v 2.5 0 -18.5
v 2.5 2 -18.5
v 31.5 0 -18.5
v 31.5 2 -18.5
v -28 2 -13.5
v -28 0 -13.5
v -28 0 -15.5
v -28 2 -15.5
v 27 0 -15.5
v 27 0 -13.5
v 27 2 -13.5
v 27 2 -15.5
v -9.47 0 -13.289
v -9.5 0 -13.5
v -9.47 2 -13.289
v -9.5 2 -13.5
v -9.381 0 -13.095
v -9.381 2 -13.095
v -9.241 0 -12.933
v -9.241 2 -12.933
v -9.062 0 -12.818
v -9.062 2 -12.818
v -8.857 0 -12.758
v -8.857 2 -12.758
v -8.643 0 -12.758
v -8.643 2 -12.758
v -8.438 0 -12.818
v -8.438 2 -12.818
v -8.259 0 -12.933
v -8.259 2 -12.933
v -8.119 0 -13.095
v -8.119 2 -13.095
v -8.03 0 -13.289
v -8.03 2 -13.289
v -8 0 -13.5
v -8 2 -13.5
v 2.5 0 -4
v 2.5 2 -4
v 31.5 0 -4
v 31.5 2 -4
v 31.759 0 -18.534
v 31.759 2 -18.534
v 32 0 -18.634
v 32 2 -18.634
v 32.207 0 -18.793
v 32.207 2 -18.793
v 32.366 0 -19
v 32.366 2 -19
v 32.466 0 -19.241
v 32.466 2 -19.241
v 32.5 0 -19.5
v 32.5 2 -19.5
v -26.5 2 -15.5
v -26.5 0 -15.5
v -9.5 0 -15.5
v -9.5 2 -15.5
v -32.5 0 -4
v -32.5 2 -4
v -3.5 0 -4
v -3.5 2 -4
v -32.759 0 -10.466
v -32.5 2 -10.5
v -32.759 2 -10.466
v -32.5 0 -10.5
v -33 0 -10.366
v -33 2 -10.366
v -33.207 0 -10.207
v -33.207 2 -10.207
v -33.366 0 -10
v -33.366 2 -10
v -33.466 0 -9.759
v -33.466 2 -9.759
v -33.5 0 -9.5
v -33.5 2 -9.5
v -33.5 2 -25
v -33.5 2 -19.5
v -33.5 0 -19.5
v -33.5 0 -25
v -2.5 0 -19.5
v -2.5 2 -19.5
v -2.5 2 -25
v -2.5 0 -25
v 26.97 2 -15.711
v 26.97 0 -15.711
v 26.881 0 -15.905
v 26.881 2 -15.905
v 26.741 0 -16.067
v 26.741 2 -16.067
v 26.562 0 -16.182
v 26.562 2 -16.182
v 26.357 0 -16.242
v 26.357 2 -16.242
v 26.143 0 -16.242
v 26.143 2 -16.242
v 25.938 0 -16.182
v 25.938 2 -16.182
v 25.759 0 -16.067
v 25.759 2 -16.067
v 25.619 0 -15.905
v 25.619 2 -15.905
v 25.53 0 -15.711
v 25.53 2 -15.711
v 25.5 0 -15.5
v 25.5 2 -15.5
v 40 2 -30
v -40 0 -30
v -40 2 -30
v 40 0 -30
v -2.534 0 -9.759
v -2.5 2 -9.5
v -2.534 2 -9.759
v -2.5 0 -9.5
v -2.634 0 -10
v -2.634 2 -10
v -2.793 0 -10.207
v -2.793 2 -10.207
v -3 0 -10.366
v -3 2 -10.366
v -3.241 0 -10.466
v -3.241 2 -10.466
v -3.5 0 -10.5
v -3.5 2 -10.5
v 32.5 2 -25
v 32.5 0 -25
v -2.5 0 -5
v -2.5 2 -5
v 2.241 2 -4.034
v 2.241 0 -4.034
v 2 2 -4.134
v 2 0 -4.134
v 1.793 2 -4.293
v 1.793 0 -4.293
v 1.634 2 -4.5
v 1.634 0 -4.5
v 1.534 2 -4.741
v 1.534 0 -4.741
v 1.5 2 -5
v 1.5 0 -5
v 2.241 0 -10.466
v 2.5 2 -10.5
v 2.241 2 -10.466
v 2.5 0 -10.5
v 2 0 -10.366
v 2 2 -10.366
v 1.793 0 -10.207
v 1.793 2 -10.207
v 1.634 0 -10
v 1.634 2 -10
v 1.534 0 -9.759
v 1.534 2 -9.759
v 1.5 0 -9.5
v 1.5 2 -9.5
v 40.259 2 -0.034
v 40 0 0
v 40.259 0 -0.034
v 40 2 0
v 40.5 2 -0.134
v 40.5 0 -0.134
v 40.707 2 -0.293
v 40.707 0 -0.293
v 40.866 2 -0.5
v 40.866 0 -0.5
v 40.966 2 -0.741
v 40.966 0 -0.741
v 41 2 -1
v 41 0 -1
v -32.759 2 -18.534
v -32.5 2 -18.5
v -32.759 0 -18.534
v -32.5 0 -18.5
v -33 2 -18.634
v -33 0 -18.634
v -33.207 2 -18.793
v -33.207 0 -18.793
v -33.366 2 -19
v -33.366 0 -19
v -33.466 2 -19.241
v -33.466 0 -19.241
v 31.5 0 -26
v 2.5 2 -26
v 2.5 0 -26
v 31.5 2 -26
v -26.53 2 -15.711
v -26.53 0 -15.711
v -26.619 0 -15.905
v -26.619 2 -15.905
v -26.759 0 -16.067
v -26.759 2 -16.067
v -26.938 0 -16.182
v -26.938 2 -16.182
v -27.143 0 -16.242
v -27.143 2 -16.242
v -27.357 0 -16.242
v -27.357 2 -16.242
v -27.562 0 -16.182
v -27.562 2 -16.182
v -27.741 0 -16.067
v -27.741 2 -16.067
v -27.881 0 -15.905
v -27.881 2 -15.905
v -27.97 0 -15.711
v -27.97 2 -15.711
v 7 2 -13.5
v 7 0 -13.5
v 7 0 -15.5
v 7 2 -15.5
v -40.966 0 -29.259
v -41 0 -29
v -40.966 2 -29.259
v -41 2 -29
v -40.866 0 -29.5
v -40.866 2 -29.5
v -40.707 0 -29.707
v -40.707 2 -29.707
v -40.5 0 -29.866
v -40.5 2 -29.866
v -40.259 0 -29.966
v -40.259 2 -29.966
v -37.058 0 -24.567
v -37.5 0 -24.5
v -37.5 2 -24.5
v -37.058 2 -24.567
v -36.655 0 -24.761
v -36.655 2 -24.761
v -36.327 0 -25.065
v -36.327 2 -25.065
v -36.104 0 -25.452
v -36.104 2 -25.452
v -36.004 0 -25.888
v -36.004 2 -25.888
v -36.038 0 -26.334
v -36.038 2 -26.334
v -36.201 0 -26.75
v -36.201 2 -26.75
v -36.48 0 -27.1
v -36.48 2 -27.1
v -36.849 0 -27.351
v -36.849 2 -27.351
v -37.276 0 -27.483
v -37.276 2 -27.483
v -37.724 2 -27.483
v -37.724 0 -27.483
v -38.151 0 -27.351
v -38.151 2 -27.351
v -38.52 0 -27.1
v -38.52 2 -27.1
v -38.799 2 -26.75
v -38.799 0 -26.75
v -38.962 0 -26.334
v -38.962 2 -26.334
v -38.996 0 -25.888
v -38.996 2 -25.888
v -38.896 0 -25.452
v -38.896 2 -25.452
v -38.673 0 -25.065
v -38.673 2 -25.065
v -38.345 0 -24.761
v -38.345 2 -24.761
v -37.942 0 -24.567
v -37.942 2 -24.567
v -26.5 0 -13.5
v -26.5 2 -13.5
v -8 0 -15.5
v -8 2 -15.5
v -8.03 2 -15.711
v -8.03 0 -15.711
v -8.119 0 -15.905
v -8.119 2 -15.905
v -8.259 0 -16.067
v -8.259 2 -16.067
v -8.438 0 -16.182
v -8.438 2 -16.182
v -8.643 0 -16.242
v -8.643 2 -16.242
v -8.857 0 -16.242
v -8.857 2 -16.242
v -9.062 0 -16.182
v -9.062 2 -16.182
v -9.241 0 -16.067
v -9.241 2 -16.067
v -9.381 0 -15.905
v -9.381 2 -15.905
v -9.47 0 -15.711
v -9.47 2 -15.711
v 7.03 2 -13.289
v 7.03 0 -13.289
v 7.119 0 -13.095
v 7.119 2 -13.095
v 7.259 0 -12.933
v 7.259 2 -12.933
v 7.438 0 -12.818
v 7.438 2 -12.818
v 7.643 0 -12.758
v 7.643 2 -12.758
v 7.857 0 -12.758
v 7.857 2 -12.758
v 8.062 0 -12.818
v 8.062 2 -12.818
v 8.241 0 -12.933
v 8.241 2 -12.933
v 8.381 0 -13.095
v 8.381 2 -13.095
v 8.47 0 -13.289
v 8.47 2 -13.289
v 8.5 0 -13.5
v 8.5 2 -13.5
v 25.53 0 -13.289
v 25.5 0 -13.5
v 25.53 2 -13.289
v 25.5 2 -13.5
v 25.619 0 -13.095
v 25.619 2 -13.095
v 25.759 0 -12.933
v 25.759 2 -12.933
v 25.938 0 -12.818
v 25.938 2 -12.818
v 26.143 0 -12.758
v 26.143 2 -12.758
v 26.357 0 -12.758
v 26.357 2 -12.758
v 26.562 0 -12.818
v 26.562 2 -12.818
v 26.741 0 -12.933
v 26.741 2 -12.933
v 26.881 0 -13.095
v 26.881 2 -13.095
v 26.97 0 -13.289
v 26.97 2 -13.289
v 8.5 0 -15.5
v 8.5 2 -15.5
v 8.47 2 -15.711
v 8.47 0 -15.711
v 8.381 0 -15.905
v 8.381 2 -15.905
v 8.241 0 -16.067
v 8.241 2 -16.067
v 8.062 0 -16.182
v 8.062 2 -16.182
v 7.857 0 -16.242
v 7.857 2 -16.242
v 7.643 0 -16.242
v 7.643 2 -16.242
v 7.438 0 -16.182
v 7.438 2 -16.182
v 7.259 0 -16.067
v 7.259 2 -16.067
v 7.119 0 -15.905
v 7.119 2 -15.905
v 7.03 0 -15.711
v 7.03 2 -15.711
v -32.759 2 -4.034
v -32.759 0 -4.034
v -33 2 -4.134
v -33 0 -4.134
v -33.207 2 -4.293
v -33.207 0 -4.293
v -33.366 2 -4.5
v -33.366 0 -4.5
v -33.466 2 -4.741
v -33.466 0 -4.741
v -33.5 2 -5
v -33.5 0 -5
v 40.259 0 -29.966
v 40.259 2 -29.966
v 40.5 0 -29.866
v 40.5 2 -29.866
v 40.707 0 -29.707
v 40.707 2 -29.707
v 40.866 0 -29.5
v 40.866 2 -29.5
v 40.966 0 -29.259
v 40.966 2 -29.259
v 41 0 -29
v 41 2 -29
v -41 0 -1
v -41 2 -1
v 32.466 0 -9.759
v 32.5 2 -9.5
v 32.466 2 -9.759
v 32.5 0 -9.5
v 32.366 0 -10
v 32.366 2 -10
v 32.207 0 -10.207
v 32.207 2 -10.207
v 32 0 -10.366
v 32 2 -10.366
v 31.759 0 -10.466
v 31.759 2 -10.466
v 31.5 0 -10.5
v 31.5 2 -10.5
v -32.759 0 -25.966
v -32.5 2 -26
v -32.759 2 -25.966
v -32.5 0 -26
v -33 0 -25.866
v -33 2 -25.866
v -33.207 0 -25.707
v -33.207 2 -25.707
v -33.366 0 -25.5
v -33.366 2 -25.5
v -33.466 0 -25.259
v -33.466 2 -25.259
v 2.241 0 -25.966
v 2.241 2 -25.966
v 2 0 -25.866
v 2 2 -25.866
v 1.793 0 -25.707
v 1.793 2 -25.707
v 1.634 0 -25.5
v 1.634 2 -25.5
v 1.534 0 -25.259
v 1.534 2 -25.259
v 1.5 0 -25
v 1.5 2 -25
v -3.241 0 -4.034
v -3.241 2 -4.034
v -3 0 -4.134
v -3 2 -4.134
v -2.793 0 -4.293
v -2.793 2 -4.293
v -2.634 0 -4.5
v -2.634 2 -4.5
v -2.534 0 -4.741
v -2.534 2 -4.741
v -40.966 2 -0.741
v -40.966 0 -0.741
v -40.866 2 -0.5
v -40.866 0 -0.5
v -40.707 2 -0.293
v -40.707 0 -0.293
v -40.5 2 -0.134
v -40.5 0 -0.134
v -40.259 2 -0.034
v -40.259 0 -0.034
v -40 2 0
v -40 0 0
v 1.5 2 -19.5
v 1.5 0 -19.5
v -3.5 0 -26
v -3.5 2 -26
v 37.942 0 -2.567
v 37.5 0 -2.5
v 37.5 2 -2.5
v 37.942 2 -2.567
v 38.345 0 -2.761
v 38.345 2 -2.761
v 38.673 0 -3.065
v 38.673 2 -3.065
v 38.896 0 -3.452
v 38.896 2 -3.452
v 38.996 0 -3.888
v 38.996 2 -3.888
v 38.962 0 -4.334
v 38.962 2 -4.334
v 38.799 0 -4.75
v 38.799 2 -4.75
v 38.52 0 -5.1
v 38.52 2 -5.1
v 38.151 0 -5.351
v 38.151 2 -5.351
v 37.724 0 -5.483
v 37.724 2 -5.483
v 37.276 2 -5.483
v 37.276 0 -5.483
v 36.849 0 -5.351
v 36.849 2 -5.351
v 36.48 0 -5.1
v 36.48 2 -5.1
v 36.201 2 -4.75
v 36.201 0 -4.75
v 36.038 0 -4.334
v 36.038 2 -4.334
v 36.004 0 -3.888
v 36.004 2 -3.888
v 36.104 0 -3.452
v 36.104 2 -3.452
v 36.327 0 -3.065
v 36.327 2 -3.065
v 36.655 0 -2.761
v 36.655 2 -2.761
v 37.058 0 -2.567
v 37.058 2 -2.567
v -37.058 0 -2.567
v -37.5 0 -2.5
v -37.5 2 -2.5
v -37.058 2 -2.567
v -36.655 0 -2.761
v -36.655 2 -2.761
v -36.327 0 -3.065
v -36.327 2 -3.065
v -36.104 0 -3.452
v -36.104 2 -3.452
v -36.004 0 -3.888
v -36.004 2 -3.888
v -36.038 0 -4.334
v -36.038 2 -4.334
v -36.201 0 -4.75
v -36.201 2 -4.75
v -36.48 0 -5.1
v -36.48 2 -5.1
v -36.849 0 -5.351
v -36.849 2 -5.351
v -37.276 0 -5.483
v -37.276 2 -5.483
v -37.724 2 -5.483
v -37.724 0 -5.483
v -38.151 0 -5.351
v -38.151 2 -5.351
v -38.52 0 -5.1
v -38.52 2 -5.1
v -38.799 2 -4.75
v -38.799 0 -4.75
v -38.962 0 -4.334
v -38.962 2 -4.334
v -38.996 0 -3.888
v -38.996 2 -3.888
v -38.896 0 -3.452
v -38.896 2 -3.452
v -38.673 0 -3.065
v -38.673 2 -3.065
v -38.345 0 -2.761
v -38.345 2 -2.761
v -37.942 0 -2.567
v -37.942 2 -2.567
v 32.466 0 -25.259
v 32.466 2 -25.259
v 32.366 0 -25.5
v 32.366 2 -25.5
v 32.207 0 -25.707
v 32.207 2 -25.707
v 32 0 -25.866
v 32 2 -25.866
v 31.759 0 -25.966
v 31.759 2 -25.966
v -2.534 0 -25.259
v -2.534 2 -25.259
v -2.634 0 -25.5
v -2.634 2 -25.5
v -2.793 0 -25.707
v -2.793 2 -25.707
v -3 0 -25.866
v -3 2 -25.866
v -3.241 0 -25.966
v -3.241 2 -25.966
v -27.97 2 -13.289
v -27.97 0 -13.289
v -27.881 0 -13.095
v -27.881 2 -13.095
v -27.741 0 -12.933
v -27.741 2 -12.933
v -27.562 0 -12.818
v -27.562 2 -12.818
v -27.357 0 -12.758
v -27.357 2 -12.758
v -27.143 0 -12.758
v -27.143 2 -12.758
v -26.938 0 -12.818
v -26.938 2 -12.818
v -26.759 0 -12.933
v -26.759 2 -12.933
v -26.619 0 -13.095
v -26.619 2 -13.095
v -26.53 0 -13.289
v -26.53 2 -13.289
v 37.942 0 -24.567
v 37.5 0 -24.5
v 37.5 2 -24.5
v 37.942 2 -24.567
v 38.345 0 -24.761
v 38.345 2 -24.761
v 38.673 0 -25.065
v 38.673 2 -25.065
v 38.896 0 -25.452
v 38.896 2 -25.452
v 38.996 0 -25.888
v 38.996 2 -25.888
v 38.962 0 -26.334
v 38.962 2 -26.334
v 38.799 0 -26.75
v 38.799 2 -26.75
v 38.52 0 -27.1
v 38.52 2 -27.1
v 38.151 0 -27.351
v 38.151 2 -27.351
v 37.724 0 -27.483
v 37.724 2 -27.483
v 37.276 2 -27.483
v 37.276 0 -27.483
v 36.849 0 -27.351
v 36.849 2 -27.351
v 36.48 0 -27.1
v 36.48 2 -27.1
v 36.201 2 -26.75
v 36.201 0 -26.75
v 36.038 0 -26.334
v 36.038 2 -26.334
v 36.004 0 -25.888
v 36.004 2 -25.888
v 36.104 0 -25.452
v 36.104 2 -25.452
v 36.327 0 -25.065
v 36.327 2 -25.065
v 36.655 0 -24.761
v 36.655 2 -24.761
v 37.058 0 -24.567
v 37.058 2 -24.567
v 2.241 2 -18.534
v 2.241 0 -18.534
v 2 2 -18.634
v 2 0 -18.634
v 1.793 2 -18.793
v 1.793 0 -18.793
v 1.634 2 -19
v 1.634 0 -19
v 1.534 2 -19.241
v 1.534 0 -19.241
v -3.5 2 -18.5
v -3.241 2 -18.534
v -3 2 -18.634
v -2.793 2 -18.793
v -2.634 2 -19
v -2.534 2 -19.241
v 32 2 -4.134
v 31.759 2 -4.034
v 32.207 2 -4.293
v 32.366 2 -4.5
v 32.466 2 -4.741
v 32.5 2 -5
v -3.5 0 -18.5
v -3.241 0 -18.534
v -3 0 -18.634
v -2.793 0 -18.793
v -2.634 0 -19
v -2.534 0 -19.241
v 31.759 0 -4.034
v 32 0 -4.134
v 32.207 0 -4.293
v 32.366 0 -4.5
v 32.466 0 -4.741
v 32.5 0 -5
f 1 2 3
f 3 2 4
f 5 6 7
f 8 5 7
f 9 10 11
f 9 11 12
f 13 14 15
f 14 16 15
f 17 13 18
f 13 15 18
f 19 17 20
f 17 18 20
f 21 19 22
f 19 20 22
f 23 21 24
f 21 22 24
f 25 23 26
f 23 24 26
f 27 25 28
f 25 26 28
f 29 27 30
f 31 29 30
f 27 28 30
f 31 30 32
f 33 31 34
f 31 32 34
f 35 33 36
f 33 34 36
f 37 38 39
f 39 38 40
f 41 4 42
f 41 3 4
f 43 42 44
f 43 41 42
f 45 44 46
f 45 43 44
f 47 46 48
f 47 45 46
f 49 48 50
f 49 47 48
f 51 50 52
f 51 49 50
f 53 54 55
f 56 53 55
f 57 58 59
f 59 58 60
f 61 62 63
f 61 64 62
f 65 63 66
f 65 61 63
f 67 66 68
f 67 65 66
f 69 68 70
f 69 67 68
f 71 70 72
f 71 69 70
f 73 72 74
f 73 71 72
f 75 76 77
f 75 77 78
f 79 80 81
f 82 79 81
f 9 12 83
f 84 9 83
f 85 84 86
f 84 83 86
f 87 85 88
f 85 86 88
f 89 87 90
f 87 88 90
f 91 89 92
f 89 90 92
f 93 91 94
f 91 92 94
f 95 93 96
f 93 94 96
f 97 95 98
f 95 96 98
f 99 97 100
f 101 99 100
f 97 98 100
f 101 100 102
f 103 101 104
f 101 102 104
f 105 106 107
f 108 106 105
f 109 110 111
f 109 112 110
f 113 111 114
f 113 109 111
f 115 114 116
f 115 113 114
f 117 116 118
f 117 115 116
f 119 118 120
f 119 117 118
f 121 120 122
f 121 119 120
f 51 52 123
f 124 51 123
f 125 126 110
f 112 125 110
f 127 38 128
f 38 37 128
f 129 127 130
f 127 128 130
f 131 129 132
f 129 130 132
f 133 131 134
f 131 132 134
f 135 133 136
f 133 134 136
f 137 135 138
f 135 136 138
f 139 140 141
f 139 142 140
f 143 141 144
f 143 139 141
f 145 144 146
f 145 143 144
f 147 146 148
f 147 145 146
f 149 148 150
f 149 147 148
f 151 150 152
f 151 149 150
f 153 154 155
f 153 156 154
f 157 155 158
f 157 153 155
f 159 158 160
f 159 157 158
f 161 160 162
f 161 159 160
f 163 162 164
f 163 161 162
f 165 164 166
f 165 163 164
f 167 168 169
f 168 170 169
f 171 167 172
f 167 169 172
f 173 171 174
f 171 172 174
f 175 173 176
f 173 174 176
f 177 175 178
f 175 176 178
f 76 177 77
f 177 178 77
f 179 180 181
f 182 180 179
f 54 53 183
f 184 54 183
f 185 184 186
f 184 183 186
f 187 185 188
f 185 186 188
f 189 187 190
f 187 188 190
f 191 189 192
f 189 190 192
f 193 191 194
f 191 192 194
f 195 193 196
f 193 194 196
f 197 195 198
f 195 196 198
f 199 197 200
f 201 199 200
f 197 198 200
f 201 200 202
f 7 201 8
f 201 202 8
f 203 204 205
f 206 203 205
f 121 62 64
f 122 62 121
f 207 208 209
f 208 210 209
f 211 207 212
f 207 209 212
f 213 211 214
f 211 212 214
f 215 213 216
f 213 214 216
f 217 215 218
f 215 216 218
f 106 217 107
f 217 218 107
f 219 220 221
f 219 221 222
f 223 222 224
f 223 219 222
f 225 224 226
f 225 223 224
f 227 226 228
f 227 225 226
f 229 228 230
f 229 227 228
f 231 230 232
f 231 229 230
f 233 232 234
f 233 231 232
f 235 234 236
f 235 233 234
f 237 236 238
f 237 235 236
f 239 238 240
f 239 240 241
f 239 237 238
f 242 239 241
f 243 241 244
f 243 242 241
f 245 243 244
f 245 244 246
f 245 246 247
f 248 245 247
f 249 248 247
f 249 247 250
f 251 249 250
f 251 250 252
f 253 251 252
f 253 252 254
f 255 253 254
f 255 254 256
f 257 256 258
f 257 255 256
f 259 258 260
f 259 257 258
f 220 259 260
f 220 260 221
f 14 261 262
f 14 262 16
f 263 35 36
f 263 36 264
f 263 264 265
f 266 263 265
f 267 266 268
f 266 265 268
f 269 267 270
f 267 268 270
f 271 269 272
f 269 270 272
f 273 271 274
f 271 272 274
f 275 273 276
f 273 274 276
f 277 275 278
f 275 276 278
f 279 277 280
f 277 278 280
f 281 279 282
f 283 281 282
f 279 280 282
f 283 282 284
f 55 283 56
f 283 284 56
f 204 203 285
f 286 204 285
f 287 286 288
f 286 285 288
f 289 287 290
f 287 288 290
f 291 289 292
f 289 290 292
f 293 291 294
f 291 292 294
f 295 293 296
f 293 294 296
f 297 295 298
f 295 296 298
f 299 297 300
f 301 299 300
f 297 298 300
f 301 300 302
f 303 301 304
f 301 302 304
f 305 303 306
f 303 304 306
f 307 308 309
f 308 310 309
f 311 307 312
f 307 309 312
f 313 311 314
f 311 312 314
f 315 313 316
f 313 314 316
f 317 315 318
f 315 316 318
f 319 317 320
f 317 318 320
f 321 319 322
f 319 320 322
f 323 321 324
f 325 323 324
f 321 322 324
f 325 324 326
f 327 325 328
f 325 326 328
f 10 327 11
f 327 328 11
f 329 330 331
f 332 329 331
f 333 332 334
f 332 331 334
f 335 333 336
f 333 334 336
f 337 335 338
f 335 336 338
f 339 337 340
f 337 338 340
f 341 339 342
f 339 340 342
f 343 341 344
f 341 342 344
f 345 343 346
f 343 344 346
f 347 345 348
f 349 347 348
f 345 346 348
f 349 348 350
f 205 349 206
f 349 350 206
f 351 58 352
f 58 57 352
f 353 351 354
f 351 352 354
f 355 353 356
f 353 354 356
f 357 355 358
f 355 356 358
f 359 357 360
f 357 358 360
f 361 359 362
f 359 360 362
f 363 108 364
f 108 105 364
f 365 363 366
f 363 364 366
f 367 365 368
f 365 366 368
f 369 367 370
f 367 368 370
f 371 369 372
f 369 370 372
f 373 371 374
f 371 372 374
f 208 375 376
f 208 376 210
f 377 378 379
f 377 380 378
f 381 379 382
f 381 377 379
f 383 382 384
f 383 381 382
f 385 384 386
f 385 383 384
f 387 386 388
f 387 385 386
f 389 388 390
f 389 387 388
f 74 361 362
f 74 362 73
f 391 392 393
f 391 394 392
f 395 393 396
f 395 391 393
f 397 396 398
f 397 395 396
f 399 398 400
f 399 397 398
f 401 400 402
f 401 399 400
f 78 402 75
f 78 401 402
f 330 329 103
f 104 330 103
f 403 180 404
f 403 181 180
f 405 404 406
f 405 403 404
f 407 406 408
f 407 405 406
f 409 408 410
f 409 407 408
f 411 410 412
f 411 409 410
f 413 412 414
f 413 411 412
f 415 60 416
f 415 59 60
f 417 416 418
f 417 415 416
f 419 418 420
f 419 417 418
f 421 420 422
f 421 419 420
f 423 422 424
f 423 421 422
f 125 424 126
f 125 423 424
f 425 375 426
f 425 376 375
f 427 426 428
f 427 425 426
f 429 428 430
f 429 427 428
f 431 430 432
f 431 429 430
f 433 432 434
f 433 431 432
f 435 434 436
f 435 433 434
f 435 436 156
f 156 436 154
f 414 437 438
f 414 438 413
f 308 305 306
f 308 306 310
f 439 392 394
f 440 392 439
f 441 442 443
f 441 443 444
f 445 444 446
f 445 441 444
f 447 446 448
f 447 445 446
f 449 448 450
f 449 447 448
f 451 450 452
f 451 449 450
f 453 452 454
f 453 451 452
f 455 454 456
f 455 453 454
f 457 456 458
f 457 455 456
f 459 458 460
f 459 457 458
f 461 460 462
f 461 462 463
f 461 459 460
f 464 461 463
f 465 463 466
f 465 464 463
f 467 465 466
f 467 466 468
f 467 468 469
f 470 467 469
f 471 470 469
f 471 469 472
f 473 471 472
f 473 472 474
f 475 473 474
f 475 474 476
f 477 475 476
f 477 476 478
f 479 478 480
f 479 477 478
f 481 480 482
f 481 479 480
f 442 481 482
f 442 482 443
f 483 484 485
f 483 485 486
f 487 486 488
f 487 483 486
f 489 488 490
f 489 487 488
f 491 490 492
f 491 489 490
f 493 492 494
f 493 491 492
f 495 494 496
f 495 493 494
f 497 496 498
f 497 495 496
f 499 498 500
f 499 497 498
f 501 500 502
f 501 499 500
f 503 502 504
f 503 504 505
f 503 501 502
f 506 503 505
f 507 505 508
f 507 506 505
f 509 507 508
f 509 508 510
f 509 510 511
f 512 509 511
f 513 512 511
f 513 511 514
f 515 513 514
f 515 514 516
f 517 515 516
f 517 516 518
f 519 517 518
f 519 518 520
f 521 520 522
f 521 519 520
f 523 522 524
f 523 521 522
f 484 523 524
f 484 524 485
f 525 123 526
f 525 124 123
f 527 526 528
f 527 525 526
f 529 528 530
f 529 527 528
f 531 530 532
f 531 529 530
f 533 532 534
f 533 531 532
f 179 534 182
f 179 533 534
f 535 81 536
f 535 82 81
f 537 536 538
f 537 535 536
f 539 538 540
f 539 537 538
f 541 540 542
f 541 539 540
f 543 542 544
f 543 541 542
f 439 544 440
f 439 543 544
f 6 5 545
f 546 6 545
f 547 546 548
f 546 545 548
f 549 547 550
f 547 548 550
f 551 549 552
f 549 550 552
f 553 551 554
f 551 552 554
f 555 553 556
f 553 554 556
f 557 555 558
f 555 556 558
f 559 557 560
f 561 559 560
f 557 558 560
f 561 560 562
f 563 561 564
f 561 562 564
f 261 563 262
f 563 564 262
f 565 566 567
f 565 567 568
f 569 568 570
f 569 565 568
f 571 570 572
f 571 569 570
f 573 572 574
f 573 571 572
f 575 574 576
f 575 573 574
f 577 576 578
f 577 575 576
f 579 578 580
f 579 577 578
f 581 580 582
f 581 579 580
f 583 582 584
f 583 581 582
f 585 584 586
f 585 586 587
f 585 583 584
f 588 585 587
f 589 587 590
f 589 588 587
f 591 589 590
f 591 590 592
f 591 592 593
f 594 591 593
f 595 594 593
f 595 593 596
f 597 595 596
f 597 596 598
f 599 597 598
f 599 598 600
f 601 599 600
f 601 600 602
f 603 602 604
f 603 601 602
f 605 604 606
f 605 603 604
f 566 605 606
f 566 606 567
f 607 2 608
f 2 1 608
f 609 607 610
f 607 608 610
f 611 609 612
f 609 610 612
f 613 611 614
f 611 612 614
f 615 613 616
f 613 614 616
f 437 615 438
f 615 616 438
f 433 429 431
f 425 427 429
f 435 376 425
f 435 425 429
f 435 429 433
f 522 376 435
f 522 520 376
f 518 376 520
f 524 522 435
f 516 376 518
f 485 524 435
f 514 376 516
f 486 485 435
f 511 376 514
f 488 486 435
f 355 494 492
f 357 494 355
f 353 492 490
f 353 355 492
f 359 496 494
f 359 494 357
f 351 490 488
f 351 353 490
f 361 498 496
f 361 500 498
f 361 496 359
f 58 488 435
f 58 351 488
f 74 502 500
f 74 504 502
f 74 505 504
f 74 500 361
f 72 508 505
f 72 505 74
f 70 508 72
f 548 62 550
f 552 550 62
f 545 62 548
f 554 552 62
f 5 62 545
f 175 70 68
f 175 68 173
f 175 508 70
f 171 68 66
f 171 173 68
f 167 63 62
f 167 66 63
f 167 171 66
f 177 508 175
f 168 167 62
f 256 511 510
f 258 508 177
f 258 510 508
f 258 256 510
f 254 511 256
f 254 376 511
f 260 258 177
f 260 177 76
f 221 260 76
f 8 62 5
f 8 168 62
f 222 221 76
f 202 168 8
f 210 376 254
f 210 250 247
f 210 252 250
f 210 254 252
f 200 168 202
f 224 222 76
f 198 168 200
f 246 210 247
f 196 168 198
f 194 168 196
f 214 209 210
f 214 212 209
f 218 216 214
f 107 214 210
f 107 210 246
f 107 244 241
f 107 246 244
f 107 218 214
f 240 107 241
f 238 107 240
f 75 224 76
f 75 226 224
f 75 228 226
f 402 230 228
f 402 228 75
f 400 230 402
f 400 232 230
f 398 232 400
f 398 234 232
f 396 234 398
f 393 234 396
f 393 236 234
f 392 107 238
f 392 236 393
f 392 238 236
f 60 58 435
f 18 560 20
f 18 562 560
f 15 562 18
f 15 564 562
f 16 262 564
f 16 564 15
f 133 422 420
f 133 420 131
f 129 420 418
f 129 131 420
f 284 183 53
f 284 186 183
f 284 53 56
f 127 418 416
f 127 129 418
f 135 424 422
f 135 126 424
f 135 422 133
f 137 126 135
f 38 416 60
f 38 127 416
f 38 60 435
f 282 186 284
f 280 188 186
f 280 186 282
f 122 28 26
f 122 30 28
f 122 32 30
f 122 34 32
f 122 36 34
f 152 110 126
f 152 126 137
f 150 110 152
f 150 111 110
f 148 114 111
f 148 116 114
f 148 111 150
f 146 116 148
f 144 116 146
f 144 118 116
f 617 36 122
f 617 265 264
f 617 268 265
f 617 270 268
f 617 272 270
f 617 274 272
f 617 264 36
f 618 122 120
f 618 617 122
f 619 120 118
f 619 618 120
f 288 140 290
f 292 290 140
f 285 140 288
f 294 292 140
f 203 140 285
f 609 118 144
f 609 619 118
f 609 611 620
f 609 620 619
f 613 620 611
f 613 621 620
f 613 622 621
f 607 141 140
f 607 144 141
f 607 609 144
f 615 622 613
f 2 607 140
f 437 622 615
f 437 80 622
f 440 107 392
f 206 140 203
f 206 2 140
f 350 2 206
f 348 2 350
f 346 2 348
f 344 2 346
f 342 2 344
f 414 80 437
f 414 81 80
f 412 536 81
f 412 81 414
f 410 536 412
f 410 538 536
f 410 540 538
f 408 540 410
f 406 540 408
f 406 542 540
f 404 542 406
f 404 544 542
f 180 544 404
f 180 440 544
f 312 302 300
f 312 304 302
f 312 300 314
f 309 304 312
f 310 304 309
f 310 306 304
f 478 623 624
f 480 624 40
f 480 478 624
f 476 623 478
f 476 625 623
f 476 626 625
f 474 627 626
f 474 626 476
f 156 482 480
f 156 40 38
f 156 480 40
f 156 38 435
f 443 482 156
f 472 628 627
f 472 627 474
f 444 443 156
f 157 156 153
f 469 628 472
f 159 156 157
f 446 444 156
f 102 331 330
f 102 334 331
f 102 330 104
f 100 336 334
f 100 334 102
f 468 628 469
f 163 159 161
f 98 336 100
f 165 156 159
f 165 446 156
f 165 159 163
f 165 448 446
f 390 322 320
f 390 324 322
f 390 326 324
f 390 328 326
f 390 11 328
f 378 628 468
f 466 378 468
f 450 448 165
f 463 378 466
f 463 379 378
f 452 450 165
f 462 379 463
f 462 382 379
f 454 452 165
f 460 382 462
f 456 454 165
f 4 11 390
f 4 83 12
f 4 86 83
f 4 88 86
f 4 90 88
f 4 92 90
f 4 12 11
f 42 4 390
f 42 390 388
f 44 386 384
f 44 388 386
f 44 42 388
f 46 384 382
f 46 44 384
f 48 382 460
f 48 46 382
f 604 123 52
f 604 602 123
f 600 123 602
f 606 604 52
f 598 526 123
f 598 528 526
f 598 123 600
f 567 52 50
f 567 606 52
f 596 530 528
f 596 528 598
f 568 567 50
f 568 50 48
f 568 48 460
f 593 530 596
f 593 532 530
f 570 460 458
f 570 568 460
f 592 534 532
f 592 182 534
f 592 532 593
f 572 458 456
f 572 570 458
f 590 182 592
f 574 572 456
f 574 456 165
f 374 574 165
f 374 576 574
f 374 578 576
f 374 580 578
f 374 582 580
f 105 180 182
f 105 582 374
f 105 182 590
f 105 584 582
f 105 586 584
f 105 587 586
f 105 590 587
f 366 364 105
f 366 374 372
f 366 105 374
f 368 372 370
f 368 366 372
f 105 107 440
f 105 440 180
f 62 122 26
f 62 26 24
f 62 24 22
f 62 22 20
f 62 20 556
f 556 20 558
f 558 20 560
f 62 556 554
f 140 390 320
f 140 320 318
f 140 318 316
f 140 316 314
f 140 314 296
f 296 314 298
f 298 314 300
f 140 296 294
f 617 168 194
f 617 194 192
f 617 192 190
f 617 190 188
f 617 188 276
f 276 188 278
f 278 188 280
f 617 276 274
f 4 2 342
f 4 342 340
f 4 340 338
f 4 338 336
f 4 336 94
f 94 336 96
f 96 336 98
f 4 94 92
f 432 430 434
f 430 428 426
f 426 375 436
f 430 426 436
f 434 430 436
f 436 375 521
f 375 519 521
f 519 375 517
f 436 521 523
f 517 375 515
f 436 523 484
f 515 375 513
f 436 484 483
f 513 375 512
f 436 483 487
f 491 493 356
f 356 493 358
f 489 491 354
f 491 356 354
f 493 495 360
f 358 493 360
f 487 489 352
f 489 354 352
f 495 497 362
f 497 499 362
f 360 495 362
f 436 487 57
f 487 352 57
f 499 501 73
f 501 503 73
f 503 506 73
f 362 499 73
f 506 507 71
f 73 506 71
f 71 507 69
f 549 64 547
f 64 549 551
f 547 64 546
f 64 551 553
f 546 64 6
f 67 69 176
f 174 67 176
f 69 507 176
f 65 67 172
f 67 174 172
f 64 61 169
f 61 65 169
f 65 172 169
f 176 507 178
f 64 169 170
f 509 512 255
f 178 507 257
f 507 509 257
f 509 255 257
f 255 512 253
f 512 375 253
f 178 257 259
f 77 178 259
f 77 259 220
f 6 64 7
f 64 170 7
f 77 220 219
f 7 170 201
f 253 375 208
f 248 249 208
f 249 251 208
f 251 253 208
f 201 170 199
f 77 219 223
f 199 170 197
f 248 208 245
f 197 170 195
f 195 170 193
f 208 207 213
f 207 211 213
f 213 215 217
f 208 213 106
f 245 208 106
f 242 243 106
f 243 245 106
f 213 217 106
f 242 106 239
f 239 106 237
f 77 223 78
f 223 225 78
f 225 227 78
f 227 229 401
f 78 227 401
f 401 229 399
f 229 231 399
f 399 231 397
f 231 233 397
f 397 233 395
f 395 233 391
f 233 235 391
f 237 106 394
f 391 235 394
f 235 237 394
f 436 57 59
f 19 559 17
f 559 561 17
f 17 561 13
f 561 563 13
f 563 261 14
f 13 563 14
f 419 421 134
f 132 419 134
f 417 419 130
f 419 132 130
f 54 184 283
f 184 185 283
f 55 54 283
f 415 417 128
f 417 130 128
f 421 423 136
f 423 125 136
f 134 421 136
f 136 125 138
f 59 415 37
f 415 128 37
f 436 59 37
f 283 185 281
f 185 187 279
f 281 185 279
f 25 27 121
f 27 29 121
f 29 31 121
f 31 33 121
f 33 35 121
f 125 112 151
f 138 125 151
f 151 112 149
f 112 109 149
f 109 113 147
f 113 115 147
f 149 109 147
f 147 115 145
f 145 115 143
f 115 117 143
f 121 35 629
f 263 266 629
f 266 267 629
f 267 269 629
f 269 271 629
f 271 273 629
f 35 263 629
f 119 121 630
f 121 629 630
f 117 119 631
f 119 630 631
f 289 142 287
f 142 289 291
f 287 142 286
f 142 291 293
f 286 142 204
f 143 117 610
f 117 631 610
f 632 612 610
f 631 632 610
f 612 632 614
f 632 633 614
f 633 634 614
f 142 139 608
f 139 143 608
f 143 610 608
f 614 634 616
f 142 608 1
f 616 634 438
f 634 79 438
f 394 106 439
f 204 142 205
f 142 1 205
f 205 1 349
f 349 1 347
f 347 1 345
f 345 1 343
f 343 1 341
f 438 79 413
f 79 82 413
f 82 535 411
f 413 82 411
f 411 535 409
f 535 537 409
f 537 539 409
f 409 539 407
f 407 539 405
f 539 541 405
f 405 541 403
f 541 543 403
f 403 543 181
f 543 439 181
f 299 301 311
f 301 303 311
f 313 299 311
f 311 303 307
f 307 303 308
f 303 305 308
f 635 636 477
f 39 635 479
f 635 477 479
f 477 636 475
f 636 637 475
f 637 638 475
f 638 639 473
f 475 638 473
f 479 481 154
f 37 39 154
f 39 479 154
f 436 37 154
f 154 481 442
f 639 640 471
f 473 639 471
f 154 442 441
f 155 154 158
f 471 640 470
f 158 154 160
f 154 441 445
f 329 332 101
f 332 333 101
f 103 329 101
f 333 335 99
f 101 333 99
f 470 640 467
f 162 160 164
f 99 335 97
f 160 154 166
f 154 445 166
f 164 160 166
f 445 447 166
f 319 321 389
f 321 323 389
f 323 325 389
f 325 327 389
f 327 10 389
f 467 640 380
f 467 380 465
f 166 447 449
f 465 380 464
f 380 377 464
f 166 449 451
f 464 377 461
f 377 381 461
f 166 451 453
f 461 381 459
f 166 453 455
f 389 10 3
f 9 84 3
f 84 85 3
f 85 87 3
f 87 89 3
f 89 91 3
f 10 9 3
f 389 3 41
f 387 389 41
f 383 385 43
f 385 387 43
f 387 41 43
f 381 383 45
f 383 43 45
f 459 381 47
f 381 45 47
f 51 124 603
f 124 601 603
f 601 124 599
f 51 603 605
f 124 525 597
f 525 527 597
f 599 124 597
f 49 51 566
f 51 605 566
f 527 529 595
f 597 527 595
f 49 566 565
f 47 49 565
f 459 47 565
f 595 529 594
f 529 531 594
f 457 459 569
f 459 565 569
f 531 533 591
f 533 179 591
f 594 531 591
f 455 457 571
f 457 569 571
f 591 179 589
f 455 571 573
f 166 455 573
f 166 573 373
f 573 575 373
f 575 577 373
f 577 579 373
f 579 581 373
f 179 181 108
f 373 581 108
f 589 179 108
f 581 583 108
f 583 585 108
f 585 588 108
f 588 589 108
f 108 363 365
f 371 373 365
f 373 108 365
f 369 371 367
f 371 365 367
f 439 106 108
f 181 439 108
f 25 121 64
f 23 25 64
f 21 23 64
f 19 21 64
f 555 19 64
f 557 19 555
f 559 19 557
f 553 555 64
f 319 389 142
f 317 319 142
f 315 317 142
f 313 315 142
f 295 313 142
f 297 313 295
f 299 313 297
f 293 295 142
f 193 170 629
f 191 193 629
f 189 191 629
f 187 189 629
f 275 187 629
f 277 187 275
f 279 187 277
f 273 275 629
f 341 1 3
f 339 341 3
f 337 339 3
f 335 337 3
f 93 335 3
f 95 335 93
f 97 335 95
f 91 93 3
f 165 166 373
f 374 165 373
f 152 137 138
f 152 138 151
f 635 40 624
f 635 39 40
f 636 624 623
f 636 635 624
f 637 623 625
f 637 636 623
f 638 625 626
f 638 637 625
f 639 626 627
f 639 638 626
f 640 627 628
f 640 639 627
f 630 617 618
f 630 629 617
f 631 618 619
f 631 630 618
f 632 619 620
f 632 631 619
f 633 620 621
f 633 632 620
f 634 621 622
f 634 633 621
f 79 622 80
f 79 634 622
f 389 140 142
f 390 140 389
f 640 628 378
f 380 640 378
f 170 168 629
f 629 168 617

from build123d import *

# Parameters (mm, degrees)
SKETCH_1_W          = 82
SKETCH_1_H          = 30
SKETCH_1_R          = 1.5
SKETCH_1_W_2        = 20
SKETCH_1_H_2        = 2
EXTRUDE_1_DEPTH     = 2
SKETCH_4_R          = 0.75
CUT_EXTRUDE_1_DEPTH = 51.842895276
SKETCH_5_W          = 31
SKETCH_5_H          = 6.5
SKETCH_5_H_2        = 7.5
CUT_EXTRUDE_2_DEPTH = 51.842895276
FILLET_1_R          = 1


with BuildPart() as part:
    # 草图1 → 凸台-拉伸1 (new body)
    with BuildSketch(Plane(origin=(0, 0, 0), x_dir=(1, 0, 0), z_dir=(0, 1, 0))):
        with Locations((0, 15)):
            Rectangle(SKETCH_1_W, SKETCH_1_H)
        with Locations(Location((-37.5, 26, 0), (0, 0, 270))):
            Circle(SKETCH_1_R, mode=Mode.SUBTRACT)
        with Locations(Location((-37.5, 4, 0), (0, 0, 270))):
            Circle(SKETCH_1_R, mode=Mode.SUBTRACT)
        with Locations(Location((37.5, 26, 0), (0, 0, 270))):
            Circle(SKETCH_1_R, mode=Mode.SUBTRACT)
        with Locations(Location((37.5, 4, 0), (0, 0, 270))):
            Circle(SKETCH_1_R, mode=Mode.SUBTRACT)
        with Locations((17, 14.5)):
            Rectangle(SKETCH_1_W_2, SKETCH_1_H_2, mode=Mode.SUBTRACT)
        with Locations((-18, 14.5)):
            Rectangle(SKETCH_1_W_2, SKETCH_1_H_2, mode=Mode.SUBTRACT)
    extrude(amount=EXTRUDE_1_DEPTH)

    # 草图4 → 切除-拉伸1 (cut, through all)
    with BuildSketch(Plane(origin=(0, 2, 0), x_dir=(1, 0, 0), z_dir=(0, 1, 0))):
        with Locations((-27.25, 15.5)):
            Circle(SKETCH_4_R)
        with Locations((-27.25, 13.5)):
            Circle(SKETCH_4_R)
        with Locations((-8.75, 15.5)):
            Circle(SKETCH_4_R)
        with Locations((-8.75, 13.5)):
            Circle(SKETCH_4_R)
        with Locations((7.75, 15.5)):
            Circle(SKETCH_4_R)
        with Locations((7.75, 13.5)):
            Circle(SKETCH_4_R)
        with Locations((26.25, 15.5)):
            Circle(SKETCH_4_R)
        with Locations((26.25, 13.5)):
            Circle(SKETCH_4_R)
    extrude(amount=-CUT_EXTRUDE_1_DEPTH, mode=Mode.SUBTRACT)

    # 草图5 → 切除-拉伸2 (cut, through all)
    with BuildSketch(Plane(origin=(0, 2, 0), x_dir=(1, 0, 0), z_dir=(0, 1, 0))):
        with Locations((-18, 7.25)):
            Rectangle(SKETCH_5_W, SKETCH_5_H)
        with Locations((-18, 22.25)):
            Rectangle(SKETCH_5_W, SKETCH_5_H_2)
        with Locations((17, 22.25)):
            Rectangle(SKETCH_5_W, SKETCH_5_H_2)
        with Locations((17, 7.25)):
            Rectangle(SKETCH_5_W, SKETCH_5_H)
    extrude(amount=-CUT_EXTRUDE_2_DEPTH, mode=Mode.SUBTRACT)

    # 圆角1
    fillet_1_edges = [part.edges().sort_by_distance(p)[0] for p in [
        (1.5, 1, -10.5),
        (32.5, 1, -10.5),
        (32.5, 1, -4),
        (1.5, 1, -4),
        (1.5, 1, -26),
        (32.5, 1, -26),
        (32.5, 1, -18.5),
        (1.5, 1, -18.5),
        (-33.5, 1, -18.5),
        (-33.5, 1, -26),
        (-2.5, 1, -26),
        (-2.5, 1, -18.5),
        (-33.5, 1, -4),
        (-33.5, 1, -10.5),
        (-2.5, 1, -10.5),
        (-2.5, 1, -4),
        (-41, 1, -30),
        (41, 1, -30),
        (41, 1, 0),
        (-41, 1, 0),
    ]]
    fillet(fillet_1_edges, radius=FILLET_1_R)


solid = part.part
